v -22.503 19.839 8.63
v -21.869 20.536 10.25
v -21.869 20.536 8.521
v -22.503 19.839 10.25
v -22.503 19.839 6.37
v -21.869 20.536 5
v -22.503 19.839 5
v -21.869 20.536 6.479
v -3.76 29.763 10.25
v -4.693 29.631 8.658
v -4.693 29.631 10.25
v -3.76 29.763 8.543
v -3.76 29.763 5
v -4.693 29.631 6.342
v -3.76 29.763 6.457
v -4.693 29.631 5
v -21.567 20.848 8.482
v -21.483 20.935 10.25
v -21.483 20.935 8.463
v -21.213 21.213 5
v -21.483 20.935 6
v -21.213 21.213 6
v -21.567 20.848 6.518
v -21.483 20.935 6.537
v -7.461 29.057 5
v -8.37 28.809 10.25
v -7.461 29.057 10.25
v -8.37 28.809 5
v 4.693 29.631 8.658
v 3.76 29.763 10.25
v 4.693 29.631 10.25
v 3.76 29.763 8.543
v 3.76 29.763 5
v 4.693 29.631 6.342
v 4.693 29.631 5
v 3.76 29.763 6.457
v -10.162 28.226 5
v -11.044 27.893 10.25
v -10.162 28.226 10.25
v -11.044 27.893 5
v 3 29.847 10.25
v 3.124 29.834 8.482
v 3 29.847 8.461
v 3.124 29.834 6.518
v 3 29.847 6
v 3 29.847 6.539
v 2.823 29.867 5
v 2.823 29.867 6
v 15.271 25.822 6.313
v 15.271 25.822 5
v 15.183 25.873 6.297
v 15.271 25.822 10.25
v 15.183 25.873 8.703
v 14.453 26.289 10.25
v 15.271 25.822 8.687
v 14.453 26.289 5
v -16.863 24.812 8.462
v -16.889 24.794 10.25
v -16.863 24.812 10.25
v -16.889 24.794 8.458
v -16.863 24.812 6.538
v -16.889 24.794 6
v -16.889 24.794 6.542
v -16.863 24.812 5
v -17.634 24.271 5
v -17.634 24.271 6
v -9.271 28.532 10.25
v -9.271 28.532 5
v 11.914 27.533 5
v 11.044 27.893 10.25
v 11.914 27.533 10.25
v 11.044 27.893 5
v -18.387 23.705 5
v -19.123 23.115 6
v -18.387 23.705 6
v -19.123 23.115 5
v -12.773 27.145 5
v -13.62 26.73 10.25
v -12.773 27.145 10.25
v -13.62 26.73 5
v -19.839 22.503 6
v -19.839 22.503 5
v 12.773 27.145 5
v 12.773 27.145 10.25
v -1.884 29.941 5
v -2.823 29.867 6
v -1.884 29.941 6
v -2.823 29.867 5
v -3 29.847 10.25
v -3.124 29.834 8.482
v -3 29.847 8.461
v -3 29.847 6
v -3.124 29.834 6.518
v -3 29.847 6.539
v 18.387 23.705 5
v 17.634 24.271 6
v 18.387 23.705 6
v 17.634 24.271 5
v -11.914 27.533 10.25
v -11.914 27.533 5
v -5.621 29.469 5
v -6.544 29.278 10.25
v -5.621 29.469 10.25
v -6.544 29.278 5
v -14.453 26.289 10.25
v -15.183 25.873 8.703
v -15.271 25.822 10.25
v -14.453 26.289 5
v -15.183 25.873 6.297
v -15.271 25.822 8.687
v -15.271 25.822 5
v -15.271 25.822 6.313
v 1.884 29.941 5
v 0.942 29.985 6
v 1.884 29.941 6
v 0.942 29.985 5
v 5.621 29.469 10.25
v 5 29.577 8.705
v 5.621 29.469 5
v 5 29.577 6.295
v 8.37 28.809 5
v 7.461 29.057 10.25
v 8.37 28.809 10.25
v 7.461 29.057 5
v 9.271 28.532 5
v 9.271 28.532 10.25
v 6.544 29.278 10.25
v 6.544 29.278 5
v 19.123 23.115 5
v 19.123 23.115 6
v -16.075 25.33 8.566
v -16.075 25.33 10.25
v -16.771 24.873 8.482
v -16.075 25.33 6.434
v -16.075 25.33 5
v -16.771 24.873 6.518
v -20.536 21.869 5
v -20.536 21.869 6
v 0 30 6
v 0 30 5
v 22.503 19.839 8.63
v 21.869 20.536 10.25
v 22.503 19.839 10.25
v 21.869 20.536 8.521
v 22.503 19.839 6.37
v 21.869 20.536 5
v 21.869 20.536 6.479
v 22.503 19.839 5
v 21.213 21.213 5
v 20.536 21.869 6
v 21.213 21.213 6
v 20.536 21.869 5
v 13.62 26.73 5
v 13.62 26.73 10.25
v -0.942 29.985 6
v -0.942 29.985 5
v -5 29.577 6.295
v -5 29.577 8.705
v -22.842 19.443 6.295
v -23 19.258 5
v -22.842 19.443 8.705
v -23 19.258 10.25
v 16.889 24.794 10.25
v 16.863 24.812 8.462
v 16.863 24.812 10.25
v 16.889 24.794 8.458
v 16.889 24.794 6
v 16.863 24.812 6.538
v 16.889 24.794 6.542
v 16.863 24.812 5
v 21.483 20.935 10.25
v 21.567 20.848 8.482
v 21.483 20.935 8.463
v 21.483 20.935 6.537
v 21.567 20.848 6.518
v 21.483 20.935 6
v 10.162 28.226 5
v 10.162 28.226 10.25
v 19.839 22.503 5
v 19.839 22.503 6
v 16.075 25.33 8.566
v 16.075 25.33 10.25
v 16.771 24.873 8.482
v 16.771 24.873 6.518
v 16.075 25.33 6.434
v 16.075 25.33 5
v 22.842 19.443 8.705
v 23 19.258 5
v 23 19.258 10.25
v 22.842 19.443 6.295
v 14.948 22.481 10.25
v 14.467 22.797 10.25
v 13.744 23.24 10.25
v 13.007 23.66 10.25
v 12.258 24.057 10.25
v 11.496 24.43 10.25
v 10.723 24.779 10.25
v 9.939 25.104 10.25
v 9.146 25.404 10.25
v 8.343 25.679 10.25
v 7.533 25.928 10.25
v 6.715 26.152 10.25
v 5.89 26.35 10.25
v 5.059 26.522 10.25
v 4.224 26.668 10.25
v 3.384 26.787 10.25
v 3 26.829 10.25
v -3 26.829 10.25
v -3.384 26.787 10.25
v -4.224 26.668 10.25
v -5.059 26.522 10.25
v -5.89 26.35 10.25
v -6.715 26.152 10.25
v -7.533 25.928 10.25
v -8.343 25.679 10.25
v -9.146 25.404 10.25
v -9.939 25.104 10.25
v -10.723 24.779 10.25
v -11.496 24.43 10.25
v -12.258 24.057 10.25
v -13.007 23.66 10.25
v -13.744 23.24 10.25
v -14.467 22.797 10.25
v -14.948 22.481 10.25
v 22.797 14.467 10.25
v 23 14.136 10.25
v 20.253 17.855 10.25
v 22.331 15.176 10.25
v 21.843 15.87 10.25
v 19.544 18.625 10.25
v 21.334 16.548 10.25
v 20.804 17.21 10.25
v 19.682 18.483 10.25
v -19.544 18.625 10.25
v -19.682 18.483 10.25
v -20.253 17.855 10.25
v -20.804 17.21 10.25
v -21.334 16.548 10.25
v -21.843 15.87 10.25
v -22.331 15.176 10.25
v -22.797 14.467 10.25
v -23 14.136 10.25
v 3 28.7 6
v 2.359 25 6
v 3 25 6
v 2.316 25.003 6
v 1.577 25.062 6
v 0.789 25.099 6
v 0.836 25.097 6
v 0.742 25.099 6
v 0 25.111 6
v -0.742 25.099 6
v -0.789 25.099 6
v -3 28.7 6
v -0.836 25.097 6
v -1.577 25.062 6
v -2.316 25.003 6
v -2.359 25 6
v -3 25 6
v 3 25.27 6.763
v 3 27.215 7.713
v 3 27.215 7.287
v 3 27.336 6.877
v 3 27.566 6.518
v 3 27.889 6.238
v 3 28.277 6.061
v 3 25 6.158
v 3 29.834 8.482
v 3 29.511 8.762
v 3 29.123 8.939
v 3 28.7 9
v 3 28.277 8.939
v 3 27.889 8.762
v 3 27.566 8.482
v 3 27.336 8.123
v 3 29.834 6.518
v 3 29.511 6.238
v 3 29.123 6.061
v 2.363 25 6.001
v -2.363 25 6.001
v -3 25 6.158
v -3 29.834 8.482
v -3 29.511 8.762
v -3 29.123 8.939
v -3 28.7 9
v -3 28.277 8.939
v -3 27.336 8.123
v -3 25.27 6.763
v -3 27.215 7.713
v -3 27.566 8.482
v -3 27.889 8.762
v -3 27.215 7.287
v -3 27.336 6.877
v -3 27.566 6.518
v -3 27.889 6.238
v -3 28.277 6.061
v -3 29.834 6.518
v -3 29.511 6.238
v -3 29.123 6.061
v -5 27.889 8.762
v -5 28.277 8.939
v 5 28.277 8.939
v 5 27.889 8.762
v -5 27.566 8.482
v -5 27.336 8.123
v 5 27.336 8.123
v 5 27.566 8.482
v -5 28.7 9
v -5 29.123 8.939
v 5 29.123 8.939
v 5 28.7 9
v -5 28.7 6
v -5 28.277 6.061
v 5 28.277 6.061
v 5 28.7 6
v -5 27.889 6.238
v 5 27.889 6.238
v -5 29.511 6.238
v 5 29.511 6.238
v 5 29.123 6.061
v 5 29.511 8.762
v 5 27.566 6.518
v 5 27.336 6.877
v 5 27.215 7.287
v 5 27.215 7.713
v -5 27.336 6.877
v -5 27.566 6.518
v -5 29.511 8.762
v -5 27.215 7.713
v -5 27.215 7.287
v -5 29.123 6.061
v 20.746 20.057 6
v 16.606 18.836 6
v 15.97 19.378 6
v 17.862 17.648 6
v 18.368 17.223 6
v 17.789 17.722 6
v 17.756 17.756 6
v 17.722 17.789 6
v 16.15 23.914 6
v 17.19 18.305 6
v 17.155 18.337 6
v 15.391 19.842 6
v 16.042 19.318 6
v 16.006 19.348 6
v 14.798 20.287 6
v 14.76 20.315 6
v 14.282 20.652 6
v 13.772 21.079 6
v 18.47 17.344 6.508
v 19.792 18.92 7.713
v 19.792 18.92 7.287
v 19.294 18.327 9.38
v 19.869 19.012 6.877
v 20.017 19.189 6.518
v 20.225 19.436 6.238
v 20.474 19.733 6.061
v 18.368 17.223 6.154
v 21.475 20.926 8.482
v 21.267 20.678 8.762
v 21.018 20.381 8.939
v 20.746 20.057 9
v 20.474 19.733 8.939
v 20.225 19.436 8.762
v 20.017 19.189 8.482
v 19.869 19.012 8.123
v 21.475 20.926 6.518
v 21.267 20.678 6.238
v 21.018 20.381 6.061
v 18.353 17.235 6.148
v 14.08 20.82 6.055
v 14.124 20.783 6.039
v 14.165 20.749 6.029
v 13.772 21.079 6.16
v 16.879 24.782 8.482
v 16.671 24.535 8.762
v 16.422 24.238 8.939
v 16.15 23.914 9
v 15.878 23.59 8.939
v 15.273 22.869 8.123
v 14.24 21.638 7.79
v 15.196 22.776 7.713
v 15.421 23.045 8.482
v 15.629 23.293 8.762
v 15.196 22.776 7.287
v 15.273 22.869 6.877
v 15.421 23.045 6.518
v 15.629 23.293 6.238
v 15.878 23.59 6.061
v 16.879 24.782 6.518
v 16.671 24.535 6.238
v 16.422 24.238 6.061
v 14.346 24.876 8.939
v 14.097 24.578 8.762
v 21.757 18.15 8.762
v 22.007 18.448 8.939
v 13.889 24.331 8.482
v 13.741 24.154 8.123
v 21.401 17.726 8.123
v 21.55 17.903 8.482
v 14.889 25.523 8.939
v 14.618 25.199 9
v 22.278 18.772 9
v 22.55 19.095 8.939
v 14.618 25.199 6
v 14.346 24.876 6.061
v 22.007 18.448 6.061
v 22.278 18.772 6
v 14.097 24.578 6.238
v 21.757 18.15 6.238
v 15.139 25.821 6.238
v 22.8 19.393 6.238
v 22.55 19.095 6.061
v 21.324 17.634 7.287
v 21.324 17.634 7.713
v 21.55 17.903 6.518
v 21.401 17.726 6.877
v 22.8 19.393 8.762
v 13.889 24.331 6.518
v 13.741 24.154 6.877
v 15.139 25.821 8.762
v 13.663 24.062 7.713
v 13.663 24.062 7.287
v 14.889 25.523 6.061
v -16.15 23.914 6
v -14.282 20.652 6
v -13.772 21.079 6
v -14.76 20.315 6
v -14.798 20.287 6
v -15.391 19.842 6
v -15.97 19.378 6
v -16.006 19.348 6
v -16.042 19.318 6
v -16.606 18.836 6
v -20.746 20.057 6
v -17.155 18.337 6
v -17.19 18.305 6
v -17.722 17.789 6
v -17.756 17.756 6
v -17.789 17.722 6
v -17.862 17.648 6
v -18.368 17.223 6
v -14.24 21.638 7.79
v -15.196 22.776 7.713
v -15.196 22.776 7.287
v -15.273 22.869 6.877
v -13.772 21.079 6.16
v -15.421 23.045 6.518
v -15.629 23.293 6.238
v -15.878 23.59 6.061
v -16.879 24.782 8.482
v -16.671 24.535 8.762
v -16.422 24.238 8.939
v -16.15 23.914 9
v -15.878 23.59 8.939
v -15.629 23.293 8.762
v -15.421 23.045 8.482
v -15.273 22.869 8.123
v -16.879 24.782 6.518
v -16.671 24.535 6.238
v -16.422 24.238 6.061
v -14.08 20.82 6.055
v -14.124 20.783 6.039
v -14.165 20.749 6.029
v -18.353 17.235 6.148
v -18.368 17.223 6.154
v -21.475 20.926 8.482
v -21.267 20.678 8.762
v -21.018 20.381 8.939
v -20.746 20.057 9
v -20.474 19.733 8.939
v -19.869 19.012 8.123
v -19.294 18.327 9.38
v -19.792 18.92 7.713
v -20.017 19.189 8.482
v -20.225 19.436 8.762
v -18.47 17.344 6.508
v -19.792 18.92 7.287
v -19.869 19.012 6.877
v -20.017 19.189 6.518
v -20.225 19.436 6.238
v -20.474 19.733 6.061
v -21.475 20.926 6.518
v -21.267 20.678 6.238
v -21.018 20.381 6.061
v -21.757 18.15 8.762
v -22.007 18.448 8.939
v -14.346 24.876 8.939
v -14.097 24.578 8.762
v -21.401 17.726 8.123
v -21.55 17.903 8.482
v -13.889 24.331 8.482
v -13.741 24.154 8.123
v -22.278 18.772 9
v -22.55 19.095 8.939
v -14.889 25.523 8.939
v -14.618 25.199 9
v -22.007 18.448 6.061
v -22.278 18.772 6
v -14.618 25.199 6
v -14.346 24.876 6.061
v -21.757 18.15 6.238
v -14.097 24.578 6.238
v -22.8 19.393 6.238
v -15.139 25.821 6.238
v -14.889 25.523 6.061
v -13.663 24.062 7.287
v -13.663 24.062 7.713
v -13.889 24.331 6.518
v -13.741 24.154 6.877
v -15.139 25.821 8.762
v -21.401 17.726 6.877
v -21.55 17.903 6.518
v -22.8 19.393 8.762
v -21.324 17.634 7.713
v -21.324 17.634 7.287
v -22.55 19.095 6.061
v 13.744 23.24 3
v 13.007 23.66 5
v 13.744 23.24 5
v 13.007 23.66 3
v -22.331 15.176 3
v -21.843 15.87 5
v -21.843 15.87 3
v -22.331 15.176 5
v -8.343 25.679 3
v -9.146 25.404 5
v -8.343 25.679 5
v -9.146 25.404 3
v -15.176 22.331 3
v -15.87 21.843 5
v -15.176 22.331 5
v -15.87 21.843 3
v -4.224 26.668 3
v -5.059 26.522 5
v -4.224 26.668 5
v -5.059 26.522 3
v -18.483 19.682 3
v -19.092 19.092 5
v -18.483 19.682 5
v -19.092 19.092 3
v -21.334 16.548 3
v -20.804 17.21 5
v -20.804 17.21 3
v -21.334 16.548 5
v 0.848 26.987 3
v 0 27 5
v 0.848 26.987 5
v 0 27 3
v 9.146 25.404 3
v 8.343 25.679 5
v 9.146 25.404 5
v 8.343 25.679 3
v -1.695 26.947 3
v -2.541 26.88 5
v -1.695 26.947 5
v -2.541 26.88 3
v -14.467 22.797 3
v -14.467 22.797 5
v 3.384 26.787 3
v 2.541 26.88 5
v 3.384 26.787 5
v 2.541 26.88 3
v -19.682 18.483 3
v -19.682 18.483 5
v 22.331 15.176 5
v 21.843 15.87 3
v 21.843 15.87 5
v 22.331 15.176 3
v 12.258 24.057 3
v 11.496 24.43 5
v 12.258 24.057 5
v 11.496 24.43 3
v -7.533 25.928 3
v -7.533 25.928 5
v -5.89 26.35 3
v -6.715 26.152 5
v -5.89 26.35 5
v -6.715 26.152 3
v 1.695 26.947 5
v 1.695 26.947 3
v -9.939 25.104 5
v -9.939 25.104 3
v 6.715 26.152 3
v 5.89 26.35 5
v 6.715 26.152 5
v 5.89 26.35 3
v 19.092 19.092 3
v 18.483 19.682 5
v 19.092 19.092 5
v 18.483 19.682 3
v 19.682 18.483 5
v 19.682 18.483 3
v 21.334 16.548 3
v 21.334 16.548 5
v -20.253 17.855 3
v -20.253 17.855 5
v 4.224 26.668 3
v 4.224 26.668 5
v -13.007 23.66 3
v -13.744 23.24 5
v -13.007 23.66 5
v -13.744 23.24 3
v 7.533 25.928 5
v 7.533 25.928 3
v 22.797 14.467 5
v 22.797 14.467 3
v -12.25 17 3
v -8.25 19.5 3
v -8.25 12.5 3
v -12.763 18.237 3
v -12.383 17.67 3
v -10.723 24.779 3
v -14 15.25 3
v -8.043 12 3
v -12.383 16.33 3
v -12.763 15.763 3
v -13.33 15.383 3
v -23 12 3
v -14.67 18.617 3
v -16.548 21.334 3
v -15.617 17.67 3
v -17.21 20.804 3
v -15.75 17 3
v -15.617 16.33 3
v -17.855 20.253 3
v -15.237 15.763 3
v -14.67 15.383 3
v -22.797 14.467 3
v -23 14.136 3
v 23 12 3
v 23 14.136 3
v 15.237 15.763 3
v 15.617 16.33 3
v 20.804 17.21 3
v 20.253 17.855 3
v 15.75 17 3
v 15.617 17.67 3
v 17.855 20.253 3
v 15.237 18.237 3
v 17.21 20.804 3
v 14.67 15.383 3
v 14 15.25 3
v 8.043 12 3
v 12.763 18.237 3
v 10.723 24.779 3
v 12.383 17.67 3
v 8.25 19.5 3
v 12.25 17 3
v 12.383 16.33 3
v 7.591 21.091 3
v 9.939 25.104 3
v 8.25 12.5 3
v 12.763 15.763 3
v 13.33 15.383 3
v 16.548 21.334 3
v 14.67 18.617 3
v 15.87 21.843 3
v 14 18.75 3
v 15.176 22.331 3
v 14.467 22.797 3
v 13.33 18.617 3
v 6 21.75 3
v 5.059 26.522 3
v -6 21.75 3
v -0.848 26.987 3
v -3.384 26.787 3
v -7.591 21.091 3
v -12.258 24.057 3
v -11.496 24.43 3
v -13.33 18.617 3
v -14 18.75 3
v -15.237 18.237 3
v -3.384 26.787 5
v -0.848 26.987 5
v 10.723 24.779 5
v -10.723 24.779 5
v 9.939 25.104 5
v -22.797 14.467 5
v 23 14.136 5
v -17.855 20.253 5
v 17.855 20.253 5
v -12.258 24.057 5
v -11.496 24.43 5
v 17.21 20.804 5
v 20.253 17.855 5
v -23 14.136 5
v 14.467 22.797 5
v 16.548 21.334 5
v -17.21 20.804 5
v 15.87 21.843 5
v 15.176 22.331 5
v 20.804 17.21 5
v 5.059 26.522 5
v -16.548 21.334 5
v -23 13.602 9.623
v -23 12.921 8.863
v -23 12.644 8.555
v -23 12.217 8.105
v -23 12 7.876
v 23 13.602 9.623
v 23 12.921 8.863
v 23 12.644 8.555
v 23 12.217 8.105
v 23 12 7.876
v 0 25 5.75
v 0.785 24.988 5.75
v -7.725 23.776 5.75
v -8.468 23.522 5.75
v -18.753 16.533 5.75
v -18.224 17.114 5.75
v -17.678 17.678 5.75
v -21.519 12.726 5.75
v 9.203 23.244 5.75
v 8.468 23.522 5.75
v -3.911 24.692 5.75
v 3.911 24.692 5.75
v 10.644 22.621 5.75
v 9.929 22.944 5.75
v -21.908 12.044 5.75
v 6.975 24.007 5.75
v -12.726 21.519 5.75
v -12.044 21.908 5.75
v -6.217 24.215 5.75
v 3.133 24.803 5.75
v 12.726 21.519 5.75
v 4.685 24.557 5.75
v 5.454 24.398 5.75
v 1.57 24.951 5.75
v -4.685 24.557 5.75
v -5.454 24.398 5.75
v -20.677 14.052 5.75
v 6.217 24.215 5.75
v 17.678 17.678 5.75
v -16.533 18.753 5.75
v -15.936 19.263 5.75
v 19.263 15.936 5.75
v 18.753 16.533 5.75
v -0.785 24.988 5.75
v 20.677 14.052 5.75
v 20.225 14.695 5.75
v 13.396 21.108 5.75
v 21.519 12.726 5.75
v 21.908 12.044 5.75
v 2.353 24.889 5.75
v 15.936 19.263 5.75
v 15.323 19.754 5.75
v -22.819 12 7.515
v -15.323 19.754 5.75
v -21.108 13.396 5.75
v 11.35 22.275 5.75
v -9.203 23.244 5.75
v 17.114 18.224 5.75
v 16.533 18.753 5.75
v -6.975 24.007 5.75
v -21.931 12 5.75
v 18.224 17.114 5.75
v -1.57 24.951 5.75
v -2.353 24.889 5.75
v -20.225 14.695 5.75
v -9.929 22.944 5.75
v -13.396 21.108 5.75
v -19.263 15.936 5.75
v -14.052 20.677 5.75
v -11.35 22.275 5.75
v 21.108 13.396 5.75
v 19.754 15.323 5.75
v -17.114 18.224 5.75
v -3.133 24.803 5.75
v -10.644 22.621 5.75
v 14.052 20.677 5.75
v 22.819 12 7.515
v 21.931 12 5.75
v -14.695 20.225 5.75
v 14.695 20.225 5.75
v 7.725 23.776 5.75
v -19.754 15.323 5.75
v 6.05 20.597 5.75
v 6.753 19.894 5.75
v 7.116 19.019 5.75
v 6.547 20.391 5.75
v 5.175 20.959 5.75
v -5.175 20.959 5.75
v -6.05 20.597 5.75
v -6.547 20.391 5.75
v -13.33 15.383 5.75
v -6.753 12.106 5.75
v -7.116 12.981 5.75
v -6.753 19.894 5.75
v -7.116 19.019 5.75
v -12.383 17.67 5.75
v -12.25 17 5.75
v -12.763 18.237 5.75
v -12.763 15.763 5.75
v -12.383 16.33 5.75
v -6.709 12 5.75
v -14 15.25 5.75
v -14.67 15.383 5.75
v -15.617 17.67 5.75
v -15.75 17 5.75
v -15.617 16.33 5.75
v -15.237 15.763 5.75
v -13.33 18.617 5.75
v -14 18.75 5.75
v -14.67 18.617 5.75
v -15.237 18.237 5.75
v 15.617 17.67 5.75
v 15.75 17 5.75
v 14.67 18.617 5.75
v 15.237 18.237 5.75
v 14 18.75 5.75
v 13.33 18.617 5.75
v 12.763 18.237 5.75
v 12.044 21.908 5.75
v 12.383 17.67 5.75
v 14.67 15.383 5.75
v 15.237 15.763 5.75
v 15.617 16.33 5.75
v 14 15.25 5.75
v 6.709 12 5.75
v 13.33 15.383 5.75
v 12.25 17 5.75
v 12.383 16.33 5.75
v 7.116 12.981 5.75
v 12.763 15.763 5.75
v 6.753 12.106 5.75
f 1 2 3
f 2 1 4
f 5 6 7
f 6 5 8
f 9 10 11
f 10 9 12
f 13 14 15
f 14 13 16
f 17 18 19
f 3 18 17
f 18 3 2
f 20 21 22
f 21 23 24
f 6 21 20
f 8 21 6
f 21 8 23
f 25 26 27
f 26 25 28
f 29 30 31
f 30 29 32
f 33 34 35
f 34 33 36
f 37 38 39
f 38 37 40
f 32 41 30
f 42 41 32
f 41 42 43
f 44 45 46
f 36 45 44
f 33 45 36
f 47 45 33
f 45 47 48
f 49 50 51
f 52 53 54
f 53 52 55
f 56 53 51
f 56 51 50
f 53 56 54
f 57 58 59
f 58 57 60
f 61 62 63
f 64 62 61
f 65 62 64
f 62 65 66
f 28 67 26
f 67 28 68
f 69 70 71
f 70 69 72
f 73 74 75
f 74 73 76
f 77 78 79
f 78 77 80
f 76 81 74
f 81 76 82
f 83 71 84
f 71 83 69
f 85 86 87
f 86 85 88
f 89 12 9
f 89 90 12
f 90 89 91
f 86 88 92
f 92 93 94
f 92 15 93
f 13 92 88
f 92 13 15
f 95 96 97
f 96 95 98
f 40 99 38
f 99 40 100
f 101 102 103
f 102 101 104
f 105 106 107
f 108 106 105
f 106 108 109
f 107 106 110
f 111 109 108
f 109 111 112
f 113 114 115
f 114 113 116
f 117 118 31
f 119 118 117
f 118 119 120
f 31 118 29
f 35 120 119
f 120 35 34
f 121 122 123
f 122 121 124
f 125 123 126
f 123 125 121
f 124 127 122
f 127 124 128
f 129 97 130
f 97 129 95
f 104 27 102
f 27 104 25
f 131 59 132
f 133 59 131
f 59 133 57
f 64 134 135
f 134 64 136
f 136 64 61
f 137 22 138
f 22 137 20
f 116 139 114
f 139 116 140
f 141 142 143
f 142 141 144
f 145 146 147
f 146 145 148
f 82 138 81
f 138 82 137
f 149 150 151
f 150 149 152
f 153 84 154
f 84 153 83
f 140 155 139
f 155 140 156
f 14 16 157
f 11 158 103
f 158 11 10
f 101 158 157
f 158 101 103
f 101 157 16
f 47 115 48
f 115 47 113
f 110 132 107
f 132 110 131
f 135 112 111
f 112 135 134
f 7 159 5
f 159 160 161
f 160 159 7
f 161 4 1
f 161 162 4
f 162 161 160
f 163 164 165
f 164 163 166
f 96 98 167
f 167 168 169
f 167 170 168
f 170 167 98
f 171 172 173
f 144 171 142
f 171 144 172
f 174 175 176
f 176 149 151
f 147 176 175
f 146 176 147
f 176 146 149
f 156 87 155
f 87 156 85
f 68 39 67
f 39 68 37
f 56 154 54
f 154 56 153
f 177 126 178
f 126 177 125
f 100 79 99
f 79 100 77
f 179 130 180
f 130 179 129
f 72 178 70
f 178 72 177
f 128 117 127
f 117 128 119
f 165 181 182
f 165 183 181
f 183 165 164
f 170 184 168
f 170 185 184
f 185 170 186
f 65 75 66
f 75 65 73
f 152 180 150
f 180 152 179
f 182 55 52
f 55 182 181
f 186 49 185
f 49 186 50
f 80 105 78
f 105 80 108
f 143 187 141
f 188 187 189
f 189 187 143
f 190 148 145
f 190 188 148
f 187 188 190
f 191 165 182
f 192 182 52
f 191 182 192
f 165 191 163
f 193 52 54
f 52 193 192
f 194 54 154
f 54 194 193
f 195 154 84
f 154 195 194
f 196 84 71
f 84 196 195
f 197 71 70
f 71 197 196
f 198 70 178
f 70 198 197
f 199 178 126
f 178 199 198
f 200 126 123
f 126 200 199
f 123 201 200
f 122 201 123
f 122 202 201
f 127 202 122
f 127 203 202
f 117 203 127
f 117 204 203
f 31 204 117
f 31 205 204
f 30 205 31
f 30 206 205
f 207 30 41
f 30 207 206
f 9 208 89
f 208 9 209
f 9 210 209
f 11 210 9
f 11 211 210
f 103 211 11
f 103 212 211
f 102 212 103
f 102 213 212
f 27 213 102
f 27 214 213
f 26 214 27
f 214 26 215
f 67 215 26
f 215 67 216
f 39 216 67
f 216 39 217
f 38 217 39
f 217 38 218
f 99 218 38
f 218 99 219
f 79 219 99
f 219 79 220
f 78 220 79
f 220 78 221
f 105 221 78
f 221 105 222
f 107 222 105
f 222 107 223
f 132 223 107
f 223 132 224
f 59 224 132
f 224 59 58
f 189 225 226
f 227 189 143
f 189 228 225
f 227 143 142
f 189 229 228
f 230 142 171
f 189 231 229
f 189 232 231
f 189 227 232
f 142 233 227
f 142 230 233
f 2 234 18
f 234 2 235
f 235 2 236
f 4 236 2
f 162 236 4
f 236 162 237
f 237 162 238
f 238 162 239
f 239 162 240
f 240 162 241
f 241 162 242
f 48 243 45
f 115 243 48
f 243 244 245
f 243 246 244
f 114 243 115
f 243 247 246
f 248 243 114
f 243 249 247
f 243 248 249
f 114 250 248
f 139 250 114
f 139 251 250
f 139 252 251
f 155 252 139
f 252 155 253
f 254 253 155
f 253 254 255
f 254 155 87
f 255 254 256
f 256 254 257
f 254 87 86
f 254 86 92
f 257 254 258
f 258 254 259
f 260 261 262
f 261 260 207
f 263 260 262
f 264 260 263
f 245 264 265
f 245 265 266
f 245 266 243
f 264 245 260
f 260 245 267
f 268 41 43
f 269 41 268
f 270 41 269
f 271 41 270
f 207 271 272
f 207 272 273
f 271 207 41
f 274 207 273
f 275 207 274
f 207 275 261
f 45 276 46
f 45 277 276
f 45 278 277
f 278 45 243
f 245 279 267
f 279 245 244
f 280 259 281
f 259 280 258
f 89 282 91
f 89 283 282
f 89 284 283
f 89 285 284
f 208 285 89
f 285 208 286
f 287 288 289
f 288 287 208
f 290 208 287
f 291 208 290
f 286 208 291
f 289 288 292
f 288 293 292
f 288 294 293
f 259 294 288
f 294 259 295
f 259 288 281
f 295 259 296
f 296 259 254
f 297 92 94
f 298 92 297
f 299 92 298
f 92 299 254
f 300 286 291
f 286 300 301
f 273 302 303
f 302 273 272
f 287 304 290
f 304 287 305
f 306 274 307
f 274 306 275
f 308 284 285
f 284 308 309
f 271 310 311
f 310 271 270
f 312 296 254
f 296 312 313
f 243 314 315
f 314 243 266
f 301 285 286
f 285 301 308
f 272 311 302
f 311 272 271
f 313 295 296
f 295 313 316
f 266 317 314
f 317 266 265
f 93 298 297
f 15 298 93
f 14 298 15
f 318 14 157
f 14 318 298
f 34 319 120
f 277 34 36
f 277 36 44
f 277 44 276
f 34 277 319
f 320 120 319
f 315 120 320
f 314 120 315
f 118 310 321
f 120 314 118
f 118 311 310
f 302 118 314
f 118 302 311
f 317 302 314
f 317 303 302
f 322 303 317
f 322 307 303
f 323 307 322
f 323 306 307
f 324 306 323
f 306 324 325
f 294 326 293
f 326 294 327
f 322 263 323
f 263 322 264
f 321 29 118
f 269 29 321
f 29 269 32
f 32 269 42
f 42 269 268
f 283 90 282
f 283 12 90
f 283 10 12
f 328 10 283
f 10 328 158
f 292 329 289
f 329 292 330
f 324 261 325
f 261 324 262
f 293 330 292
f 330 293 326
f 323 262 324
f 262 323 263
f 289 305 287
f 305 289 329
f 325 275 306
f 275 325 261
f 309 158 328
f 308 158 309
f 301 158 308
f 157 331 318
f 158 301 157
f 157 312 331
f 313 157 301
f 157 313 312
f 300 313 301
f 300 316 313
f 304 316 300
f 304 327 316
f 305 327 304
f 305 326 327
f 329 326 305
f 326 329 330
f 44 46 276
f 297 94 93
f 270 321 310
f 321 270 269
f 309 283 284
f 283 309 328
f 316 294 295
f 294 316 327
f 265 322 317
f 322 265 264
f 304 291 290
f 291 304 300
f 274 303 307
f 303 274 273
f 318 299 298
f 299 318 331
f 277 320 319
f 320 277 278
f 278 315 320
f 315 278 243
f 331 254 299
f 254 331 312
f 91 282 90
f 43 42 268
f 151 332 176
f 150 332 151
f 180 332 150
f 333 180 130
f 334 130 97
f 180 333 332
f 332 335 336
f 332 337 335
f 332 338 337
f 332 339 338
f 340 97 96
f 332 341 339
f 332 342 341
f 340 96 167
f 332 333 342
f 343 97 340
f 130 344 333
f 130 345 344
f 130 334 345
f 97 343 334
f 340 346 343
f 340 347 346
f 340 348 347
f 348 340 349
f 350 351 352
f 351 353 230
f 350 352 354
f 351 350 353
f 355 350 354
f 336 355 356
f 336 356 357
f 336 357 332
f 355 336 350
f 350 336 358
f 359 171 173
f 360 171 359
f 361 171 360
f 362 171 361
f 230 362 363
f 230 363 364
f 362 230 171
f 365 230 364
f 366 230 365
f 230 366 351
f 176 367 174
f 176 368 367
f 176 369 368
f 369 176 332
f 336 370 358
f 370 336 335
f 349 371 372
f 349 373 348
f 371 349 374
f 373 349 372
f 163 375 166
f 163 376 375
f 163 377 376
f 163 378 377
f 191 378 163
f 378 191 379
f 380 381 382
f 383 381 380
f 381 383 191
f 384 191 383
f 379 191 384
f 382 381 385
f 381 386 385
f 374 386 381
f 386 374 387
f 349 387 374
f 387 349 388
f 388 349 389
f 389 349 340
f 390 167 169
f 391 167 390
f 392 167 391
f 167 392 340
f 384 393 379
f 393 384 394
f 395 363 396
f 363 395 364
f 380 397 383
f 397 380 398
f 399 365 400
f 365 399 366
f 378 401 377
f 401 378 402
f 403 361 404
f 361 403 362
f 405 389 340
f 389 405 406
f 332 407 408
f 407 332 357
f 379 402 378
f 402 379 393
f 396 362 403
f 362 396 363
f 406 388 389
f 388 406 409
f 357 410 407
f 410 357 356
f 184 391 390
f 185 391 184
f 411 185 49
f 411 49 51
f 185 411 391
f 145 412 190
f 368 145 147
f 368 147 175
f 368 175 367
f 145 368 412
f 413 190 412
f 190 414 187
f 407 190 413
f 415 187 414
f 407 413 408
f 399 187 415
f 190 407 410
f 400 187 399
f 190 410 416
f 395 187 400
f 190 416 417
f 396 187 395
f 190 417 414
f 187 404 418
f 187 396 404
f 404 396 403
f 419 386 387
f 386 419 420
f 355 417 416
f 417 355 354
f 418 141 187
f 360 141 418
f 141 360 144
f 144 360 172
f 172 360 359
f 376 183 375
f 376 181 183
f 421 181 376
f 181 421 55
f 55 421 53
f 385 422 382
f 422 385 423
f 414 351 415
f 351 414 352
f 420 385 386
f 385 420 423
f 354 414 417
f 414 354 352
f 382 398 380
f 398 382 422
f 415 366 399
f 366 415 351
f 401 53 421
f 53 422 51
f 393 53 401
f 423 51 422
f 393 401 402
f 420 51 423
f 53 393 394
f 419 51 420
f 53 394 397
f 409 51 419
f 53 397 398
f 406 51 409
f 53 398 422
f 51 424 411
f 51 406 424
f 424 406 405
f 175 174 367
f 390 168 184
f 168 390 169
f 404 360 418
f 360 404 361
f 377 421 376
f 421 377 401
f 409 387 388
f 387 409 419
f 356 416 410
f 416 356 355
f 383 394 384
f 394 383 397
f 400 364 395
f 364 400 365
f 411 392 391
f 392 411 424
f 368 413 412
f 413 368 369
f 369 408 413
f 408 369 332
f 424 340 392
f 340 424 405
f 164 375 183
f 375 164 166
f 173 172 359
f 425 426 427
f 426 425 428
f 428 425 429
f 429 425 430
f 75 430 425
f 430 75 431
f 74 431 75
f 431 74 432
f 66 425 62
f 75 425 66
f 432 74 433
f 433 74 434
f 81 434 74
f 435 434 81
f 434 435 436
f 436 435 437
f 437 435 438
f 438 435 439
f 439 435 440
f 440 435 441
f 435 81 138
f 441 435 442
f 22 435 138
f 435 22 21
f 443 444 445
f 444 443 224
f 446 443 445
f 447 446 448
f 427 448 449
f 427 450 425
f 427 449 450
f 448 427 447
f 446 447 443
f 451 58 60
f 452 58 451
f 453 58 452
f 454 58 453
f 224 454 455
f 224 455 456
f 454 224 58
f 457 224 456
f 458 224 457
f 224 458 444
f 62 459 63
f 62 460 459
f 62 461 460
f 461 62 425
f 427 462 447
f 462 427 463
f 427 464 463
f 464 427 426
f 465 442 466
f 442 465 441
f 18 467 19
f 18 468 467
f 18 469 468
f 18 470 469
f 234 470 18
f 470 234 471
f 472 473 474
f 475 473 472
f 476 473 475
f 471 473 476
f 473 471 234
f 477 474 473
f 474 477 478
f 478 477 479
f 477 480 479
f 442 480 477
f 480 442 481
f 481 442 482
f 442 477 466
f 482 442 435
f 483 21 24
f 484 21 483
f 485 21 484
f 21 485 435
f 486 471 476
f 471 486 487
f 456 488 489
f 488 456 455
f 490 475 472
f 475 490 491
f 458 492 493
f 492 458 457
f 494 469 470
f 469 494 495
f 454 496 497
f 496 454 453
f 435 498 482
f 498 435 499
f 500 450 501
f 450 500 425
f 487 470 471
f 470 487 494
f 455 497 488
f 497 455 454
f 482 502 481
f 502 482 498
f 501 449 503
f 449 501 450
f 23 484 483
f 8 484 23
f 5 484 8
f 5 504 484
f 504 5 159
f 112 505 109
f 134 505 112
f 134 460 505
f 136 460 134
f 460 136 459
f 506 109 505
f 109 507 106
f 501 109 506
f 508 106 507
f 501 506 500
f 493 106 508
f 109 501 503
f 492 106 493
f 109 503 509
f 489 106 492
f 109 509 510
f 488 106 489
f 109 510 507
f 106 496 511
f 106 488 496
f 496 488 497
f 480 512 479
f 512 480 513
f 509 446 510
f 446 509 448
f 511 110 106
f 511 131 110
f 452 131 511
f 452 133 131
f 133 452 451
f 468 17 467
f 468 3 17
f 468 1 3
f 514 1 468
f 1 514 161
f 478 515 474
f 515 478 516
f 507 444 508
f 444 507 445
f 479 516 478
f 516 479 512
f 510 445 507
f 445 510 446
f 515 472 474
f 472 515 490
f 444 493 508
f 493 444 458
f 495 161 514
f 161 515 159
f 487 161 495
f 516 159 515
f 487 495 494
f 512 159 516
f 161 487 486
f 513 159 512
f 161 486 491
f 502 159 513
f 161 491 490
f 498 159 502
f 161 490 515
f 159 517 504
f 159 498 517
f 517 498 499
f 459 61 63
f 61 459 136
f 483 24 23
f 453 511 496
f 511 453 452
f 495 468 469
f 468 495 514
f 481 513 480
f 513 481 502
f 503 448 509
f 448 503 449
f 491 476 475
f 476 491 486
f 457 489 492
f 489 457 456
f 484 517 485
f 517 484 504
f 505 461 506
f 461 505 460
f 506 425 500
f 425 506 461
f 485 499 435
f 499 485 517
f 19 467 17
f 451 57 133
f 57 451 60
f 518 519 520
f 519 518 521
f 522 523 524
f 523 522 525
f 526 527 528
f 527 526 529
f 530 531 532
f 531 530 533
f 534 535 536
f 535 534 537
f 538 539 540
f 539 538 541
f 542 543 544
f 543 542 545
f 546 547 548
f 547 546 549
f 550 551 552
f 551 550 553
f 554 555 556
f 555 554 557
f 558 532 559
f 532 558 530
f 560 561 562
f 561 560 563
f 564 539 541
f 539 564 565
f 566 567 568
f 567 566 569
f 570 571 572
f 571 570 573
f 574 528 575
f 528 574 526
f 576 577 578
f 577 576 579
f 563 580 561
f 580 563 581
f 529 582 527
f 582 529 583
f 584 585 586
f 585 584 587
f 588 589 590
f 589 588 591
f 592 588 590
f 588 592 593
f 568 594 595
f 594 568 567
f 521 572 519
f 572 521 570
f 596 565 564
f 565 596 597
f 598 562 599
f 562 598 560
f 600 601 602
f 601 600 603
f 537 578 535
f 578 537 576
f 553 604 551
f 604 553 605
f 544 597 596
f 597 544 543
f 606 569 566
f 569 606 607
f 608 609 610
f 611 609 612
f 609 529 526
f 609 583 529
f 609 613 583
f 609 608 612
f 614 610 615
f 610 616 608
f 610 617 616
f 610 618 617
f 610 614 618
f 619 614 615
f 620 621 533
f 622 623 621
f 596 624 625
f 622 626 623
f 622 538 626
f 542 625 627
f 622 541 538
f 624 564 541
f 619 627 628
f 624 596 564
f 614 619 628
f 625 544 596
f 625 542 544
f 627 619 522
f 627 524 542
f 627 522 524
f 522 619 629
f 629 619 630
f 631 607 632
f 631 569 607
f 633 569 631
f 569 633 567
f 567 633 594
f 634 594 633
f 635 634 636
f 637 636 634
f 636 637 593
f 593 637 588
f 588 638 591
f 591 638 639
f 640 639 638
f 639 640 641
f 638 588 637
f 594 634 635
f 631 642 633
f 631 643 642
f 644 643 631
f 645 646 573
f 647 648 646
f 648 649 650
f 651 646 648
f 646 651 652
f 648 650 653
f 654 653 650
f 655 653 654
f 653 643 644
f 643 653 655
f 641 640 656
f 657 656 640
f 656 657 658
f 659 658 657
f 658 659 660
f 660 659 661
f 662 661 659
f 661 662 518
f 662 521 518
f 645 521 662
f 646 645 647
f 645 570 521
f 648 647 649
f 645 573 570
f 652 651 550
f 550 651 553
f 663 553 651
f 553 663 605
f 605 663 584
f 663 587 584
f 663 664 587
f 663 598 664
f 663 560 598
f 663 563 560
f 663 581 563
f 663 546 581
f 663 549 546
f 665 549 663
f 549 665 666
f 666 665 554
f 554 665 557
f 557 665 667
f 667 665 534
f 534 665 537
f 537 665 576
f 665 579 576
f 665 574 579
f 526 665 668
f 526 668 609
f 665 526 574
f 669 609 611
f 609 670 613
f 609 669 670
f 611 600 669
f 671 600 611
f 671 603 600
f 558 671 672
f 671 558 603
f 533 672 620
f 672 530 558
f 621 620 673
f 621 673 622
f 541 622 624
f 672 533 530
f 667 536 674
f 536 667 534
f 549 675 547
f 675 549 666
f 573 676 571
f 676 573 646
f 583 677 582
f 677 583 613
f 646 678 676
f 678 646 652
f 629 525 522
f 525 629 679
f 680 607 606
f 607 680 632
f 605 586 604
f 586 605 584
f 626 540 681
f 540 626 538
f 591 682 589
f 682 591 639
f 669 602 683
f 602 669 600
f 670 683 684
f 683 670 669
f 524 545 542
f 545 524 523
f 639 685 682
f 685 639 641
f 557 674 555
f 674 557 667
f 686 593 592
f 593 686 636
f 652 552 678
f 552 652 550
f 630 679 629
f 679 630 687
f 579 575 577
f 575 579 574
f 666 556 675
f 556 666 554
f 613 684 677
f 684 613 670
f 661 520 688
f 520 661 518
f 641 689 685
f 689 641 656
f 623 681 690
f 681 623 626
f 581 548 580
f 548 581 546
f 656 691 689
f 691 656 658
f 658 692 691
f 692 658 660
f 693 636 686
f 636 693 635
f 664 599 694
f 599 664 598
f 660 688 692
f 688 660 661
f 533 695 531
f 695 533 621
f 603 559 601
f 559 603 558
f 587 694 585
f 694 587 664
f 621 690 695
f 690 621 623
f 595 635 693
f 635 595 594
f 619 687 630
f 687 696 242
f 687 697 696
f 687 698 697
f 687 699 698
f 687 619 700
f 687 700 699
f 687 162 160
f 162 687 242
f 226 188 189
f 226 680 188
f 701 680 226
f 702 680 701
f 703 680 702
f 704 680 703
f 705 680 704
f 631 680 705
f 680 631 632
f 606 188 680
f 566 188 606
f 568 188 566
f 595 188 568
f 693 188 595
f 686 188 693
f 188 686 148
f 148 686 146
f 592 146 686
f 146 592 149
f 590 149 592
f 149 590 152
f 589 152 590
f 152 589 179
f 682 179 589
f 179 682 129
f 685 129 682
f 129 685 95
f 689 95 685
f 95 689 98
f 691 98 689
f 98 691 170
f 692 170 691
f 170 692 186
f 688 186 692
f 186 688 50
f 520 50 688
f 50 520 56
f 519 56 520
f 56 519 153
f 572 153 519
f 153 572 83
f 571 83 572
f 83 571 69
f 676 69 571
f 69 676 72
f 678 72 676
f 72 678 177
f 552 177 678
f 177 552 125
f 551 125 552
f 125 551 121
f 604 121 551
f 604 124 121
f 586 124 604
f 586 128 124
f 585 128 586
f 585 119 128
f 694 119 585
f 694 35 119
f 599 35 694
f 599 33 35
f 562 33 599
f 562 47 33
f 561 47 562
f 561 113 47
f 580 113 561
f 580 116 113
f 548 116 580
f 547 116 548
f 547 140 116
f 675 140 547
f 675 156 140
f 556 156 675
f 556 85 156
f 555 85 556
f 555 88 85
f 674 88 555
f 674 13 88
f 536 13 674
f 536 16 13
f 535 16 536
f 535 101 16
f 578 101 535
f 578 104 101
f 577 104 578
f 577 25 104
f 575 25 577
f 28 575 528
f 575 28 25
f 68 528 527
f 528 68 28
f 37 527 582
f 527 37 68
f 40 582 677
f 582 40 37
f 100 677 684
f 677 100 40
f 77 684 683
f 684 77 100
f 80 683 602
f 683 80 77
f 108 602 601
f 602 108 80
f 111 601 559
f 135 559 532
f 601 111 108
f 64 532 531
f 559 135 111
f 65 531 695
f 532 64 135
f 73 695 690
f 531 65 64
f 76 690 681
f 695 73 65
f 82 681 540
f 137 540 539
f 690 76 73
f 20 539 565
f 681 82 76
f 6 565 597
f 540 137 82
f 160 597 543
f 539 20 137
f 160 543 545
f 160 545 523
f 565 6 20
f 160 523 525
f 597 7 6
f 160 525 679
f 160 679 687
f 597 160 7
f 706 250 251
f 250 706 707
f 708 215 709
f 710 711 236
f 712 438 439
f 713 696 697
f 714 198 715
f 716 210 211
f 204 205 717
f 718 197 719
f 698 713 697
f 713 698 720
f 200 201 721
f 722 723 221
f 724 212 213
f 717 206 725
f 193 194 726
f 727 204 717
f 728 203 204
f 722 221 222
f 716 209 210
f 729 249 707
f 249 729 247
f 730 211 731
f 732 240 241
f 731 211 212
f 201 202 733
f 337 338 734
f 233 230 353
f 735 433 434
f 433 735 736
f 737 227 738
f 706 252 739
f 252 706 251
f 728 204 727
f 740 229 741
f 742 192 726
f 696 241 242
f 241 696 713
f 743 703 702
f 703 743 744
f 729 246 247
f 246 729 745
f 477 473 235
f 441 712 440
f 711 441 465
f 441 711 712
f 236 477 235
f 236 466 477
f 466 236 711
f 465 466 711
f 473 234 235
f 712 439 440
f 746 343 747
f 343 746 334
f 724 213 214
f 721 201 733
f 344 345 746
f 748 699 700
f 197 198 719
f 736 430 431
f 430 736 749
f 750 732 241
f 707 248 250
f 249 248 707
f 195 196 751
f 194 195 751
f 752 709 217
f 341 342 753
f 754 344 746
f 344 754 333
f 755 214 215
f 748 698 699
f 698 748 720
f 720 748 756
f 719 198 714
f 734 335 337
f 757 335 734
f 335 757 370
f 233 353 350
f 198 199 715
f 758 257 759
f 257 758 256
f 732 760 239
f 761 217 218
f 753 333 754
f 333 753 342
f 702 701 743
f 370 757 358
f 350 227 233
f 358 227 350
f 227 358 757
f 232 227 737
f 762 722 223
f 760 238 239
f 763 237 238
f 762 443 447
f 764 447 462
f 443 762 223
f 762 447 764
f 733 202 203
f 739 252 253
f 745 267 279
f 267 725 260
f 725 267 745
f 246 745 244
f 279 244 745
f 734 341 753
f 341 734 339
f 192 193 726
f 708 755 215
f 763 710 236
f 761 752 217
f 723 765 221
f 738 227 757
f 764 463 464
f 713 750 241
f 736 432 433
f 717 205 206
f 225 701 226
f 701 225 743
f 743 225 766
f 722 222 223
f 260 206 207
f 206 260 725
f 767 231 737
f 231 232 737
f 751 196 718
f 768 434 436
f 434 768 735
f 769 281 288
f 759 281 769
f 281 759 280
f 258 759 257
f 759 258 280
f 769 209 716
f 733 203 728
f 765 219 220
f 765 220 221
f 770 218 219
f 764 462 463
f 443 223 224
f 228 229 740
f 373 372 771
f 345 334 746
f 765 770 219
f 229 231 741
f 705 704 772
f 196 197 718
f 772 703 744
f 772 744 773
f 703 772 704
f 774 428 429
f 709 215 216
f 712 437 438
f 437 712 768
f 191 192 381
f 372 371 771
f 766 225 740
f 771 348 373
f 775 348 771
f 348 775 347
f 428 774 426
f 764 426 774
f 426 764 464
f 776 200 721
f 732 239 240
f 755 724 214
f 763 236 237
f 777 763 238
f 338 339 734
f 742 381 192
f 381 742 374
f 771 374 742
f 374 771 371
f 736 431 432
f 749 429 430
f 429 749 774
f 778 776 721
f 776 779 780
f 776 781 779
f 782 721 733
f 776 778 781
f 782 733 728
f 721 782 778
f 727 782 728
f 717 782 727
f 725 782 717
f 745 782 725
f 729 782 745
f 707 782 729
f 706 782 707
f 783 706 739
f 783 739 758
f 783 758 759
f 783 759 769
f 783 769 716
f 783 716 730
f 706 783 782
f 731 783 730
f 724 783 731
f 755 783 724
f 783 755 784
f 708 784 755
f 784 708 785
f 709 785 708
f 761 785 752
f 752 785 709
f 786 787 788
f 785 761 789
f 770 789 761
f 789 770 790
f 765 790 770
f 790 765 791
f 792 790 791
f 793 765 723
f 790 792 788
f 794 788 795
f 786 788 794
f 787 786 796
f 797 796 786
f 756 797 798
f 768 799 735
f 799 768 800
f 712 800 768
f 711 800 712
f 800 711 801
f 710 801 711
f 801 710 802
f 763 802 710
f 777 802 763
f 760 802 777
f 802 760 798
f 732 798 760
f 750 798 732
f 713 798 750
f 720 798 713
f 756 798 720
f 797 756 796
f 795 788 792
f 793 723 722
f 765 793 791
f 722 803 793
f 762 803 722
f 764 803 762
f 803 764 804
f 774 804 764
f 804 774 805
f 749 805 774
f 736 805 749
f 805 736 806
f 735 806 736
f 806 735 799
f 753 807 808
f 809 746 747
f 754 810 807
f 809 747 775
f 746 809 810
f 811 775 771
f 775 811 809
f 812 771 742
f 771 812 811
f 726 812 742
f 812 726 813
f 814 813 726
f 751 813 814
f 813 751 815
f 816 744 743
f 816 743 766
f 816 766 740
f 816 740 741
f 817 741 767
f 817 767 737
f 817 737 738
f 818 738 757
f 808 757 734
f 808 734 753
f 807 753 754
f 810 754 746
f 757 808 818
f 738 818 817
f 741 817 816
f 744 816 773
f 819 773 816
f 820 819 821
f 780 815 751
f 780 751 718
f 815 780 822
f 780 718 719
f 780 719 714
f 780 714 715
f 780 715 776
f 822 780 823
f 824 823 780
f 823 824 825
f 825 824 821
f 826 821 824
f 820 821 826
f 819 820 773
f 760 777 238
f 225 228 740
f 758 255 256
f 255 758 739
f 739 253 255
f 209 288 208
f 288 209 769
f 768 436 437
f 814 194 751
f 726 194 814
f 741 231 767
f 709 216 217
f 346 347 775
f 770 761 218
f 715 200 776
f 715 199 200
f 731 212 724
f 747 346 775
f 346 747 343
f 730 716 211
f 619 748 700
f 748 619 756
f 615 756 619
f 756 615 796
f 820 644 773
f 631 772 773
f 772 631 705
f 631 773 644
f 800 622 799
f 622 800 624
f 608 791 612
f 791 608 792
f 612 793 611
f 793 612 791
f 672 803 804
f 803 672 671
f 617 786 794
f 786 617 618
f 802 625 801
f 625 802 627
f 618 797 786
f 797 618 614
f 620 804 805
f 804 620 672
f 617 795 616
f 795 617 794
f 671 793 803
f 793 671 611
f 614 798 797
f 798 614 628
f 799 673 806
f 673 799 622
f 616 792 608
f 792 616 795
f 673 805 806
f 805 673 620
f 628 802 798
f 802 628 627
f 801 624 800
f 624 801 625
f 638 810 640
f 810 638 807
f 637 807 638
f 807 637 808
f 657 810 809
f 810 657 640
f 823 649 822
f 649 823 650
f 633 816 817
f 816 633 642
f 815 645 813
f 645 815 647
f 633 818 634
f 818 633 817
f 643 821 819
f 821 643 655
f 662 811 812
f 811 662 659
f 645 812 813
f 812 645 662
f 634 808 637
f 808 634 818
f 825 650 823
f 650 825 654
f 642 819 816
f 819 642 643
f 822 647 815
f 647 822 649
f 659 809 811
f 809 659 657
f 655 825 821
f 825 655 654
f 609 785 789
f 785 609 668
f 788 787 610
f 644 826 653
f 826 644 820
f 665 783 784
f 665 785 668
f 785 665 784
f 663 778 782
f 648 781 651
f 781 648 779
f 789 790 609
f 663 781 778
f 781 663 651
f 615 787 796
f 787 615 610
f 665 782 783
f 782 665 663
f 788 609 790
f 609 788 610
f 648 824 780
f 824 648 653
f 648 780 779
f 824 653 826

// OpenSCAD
tol=0.25;


intersection(){
    translate([0,30,0])
linear_extrude(height=20) square(size=[46,80],center=true);

difference(){

    union(){
        // main boss
        translate([0,0,2]) color("yellow")
        linear_extrude(height=4)  circle(r=30,center=true,$fn=200);
        
        // rail for hinges
        translate([0,0,8])
        cylinder(r=30,h=4.5,center=true,$fn=200);
    }

    // cuts front to back etc
    translate([0,0,8])
    cylinder(r1=25,r2=27,h=4.5,center=true,$fn=200);
        
    translate([0,0,0]) color("yellow")
    linear_extrude(height=12)  square(size=[80,24],center=true);
    
    translate([0,-14,0])
    linear_extrude(height=12)  square(size=[16,8],center=true);

    // cutouts for hinges in 6 locations
    for(a=[0, 40, -40, 180, 180-40, 180+40])
    rotate([0,0,a])
    translate([0,-28,6]) color("red"){

            linear_extrude(height=5,scale=1)
            square(size=[6,6],center=true);
            
            translate([0,-0.7,1.5]) rotate([0,90,0])
            cylinder(r=1.5,h=10,center=true,$fn=22);
        }

difference(){

// Base boss
    union(){
        translate([0,0,0]) color("yellow")
        linear_extrude(height=9)  circle(r=30,center=true,$fn=200);


    }
    
// Simplified version of BB1a
    translate([-27,-1,2]) rotate([90,0,0])
    union(){
        translate([27,1,-1]) color("pink") rotate([-90,0,0])
        linear_extrude(height=65)  circle(r=27,center=true,$fn=200);

        // Base 1 plate
        B1p=[ [0,0], [54,0], [54,70], [44,80],
        [10,80], [0,70] ];
        translate([0,0,0]) color("gray")
        linear_extrude(height=4.5)
        polygon(points=B1p);

        // Bottom side outer rail  THICKENED 
        translate ([0,0,-11.5]) color("gray") 
            linear_extrude(height=11.5,convexity=100) polygon(points=B1p);
        
 

        // extra block  cutout for the battery cable
        translate([-4,5,4]) color("pink"){
            linear_extrude(height=18) 
            offset(r=tol)
             square(size=[14, 14]);
        }
        
        // another cutout for the USB charger plug
        translate([6,-4,0]) color("red"){
            linear_extrude(height=9) 
            //offset(r=1,$fn=8) offset(r=-1,$fn=8)
            square(size=[14, 16]);
        }
        
        // Front to back cut
        translate([4,3,-40]) color("cyan"){
            // switch body including solder lug clearance
            linear_extrude(height=80) 
             square(size=[46, 30]);
        }
        
        
        
    }  // end of BB1a union



} // end of top boss difference cuts   

    // New bolt hole for gasket and internal features
    translate([0,-22,0]) color("cyan"){
        cylinder(r=1.5+tol,h=20,center=true,$fn=16);
    }
    // New bolt hole for gasket and internal features
    translate([-14,17,0]) color("cyan"){
        cylinder(r=1.5+tol,h=20,center=true,$fn=16);
    }
    // New bolt hole for gasket and internal features
    translate([14,17,0]) color("cyan"){
        cylinder(r=1.5+tol,h=20,center=true,$fn=16);
    }

    
// add text for Brights
translate ([0,-12,2.4]) rotate([0,0,0]) color("red") 
    linear_extrude(height=1.2){
    text("4B", font = "Open Sans:style=Bold", size=7,halign="center",valign="center",spacing=1.1);
    }



difference(){
    // topside reinforce pogo pins
    translate([0,16,3.0]) color("red")
    linear_extrude(height=4,scale=0.8)
    offset(r=2+tol,$fn=8) square(size=[12,7],center=true);

}
}
}

/*

for(a=[0, 40, -40, 180, 180-40, 180+40])
    rotate([0,0,a])
    translate([0,-27,7]) color("red"){
        difference(){
            linear_extrude(height=4.5,scale=1)
            offset(r=1,$fn=8) square(size=[24,2],center=true);

            linear_extrude(height=5,scale=1)
            square(size=[6,4],center=true);
            
            translate([0,-0.7,1.5]) rotate([0,90,0])
            cylinder(r=1.5,h=10,center=true,$fn=22);
        }
    }


*/
